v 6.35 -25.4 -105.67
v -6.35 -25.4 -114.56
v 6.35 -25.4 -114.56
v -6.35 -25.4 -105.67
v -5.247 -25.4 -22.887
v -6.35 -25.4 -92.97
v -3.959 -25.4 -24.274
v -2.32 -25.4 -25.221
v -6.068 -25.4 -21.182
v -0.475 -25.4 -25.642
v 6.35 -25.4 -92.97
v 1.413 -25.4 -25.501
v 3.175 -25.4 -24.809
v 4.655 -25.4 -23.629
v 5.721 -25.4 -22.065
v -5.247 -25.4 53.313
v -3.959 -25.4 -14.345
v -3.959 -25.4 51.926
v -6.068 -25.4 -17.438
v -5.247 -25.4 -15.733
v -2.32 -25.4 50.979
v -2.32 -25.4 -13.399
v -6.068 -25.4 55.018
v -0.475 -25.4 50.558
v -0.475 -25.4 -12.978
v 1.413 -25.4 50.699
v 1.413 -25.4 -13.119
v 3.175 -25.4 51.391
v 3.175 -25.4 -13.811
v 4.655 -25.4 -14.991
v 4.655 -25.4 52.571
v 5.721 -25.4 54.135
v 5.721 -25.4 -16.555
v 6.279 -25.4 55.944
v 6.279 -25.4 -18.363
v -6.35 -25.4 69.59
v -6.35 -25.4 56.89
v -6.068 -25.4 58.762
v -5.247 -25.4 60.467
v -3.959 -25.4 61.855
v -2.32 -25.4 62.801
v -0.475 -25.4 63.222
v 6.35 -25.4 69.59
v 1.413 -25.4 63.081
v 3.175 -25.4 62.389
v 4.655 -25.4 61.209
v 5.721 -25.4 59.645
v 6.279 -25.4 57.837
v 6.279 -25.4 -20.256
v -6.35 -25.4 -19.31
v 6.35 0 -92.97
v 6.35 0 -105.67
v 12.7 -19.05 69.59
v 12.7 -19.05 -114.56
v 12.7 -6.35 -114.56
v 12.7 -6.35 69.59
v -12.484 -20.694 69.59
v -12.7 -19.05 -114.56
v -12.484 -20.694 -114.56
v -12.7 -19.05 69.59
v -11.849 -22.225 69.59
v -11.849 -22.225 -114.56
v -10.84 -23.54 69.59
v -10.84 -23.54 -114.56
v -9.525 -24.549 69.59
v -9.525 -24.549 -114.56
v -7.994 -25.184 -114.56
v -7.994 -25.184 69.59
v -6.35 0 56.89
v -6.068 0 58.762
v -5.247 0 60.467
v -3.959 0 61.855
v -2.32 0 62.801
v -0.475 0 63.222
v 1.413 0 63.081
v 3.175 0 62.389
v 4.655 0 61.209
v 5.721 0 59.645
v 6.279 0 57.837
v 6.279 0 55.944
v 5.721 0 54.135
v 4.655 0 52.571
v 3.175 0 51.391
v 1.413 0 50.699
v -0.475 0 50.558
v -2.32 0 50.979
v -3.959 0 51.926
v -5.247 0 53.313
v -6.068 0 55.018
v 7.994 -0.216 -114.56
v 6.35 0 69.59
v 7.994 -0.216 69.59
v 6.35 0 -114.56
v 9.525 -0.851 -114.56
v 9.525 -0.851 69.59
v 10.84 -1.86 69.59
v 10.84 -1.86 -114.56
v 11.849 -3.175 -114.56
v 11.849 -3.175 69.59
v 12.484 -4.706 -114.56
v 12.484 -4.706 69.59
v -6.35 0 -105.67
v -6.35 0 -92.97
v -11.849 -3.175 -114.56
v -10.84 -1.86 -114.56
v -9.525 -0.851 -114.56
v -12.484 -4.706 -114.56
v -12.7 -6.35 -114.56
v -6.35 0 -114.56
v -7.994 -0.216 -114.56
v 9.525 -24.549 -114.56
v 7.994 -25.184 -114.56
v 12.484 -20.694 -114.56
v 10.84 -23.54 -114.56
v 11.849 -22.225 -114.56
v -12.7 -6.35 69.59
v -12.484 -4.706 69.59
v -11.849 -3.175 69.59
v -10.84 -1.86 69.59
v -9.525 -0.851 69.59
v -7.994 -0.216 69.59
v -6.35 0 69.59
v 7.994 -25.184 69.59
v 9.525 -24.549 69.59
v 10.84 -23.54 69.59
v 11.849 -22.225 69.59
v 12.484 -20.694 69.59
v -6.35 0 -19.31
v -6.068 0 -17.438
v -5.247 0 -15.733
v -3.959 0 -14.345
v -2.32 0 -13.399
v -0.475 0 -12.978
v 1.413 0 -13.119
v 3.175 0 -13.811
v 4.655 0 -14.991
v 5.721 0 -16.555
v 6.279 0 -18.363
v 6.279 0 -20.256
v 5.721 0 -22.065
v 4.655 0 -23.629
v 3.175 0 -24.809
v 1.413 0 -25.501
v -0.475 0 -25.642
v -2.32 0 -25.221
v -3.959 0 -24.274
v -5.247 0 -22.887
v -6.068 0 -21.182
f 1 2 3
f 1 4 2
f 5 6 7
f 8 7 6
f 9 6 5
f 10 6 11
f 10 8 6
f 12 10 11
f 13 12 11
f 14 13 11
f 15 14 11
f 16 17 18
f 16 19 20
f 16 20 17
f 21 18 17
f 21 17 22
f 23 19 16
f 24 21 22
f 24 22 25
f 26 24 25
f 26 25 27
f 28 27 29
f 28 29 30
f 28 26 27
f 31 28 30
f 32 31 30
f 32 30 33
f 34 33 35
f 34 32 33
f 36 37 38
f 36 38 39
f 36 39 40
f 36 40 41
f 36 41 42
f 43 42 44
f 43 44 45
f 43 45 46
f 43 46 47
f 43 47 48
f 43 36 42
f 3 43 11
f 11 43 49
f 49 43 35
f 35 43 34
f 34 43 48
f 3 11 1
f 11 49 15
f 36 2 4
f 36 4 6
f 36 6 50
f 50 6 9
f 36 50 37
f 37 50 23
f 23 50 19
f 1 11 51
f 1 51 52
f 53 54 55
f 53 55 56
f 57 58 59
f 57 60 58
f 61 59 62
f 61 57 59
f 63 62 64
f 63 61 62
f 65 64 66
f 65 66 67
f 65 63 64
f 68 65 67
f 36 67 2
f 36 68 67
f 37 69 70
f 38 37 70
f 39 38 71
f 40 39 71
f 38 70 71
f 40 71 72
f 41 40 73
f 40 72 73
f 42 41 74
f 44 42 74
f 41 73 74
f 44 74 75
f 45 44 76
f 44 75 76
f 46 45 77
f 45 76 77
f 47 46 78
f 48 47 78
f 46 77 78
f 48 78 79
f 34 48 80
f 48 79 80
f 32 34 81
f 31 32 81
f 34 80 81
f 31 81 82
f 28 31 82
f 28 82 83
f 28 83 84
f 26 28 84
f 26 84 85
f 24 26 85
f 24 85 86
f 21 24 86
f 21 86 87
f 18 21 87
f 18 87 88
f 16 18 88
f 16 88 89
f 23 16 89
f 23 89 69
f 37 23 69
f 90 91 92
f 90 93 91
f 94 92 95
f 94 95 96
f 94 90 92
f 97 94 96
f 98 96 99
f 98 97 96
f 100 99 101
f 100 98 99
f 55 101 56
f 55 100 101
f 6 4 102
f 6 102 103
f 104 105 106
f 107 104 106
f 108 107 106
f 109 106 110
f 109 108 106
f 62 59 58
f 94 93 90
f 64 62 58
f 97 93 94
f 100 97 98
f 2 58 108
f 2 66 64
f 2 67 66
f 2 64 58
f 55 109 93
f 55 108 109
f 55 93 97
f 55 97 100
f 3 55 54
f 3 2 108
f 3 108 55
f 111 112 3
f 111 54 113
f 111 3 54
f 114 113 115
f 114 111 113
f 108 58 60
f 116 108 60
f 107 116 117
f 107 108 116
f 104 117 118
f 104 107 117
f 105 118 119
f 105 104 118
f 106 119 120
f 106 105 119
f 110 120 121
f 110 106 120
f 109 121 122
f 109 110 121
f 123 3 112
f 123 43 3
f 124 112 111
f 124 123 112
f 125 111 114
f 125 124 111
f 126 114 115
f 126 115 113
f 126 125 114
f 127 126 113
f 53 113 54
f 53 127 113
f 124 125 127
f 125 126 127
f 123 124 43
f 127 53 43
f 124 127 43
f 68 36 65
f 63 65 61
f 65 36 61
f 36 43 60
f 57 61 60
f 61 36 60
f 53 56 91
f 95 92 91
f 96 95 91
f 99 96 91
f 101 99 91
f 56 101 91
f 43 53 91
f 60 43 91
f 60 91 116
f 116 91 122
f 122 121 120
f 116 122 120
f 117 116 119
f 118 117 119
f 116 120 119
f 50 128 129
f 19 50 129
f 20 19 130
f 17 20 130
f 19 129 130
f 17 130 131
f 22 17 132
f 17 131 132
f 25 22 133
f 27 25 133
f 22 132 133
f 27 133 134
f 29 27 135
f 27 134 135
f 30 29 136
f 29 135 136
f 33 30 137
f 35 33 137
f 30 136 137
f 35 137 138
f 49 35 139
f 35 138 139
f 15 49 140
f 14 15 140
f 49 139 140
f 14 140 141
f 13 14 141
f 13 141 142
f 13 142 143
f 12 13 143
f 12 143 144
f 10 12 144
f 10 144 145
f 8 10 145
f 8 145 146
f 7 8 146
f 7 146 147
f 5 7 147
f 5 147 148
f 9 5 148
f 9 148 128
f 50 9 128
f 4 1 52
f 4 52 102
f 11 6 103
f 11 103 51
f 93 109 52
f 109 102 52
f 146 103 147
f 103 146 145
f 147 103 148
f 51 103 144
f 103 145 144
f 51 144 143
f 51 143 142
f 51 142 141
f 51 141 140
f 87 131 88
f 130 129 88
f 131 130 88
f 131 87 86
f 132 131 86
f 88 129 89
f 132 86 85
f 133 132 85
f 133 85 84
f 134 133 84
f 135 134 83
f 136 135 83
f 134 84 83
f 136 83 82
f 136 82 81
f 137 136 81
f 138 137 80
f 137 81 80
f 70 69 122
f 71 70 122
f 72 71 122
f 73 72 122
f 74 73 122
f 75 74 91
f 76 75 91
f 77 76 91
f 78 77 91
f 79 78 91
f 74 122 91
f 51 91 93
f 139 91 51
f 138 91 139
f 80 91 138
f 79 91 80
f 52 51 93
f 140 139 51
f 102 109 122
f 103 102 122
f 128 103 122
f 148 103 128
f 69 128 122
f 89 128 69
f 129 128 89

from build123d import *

# Parameters (mm, degrees)
F1_DEPTH = 25.4
F3_D     = 12.7
F3_DEPTH = 254
F3_TIP   = 3.8154649308
F4_W     = 25.4
F4_H     = 82.55
F5_DEPTH = 25.4
F7_DEPTH = 25.4
F8_R     = 6.34999


# Not quite as in the source:
# - a fillet or chamfer is up to 0.001 mm smaller than in the source, because OpenCascade refuses the exact size


with BuildPart() as f1:
    # F0 (on Front) → F1 (new body)
    with BuildSketch(Plane.XZ):
        Polygon((-12.7, -32.0098340811), (0, -32.0098340811), (12.7, -32.0098340811), (12.7, 69.5901659189), (-12.7, 69.5901659189), align=None)
    extrude(amount=F1_DEPTH)

    # F3
    with Locations(Plane.XZ.offset(25.4)):
        with Locations((0, 56.8901659189), (0, -19.3098340811)):
            Hole(F3_D / 2, depth=F3_DEPTH)
            with Locations((0, 0, -(F3_DEPTH + F3_TIP / 2))):  # 118° drill point
                Cone(0, F3_D / 2, F3_TIP, mode=Mode.SUBTRACT)

    # F4 (on face) → F5 (join)
    with BuildSketch(Plane.XZ.offset(25.4)):
        with Locations((0, -73.2848340811)):
            Rectangle(F4_W, F4_H)
    extrude(amount=-F5_DEPTH)

    # F6 (on face) → F7 (cut)
    with BuildSketch(Plane(origin=(0, 0, 0), x_dir=(-1, 0, 0), z_dir=(0, 1, 0))):
        Polygon((0, -105.6698340811), (6.35, -105.6698340811), (6.35, -92.9698340811), (-6.35, -92.9698340811), (-6.35, -105.6698340811), align=None)
    extrude(amount=-F7_DEPTH, mode=Mode.SUBTRACT)

    # F8 (radius 6.35 in the source; OpenCascade refuses exactly that, so slightly less here)
    f8_edges = [f1.edges().sort_by_distance(p)[0] for p in [
        (12.7, 0, -22.484834),
        (-12.7, 0, -22.484834),
        (-12.7, -25.4, -22.484834),
        (12.7, -25.4, -22.484834),
    ]]
    fillet(f8_edges, radius=F8_R)


solid = f1.part
